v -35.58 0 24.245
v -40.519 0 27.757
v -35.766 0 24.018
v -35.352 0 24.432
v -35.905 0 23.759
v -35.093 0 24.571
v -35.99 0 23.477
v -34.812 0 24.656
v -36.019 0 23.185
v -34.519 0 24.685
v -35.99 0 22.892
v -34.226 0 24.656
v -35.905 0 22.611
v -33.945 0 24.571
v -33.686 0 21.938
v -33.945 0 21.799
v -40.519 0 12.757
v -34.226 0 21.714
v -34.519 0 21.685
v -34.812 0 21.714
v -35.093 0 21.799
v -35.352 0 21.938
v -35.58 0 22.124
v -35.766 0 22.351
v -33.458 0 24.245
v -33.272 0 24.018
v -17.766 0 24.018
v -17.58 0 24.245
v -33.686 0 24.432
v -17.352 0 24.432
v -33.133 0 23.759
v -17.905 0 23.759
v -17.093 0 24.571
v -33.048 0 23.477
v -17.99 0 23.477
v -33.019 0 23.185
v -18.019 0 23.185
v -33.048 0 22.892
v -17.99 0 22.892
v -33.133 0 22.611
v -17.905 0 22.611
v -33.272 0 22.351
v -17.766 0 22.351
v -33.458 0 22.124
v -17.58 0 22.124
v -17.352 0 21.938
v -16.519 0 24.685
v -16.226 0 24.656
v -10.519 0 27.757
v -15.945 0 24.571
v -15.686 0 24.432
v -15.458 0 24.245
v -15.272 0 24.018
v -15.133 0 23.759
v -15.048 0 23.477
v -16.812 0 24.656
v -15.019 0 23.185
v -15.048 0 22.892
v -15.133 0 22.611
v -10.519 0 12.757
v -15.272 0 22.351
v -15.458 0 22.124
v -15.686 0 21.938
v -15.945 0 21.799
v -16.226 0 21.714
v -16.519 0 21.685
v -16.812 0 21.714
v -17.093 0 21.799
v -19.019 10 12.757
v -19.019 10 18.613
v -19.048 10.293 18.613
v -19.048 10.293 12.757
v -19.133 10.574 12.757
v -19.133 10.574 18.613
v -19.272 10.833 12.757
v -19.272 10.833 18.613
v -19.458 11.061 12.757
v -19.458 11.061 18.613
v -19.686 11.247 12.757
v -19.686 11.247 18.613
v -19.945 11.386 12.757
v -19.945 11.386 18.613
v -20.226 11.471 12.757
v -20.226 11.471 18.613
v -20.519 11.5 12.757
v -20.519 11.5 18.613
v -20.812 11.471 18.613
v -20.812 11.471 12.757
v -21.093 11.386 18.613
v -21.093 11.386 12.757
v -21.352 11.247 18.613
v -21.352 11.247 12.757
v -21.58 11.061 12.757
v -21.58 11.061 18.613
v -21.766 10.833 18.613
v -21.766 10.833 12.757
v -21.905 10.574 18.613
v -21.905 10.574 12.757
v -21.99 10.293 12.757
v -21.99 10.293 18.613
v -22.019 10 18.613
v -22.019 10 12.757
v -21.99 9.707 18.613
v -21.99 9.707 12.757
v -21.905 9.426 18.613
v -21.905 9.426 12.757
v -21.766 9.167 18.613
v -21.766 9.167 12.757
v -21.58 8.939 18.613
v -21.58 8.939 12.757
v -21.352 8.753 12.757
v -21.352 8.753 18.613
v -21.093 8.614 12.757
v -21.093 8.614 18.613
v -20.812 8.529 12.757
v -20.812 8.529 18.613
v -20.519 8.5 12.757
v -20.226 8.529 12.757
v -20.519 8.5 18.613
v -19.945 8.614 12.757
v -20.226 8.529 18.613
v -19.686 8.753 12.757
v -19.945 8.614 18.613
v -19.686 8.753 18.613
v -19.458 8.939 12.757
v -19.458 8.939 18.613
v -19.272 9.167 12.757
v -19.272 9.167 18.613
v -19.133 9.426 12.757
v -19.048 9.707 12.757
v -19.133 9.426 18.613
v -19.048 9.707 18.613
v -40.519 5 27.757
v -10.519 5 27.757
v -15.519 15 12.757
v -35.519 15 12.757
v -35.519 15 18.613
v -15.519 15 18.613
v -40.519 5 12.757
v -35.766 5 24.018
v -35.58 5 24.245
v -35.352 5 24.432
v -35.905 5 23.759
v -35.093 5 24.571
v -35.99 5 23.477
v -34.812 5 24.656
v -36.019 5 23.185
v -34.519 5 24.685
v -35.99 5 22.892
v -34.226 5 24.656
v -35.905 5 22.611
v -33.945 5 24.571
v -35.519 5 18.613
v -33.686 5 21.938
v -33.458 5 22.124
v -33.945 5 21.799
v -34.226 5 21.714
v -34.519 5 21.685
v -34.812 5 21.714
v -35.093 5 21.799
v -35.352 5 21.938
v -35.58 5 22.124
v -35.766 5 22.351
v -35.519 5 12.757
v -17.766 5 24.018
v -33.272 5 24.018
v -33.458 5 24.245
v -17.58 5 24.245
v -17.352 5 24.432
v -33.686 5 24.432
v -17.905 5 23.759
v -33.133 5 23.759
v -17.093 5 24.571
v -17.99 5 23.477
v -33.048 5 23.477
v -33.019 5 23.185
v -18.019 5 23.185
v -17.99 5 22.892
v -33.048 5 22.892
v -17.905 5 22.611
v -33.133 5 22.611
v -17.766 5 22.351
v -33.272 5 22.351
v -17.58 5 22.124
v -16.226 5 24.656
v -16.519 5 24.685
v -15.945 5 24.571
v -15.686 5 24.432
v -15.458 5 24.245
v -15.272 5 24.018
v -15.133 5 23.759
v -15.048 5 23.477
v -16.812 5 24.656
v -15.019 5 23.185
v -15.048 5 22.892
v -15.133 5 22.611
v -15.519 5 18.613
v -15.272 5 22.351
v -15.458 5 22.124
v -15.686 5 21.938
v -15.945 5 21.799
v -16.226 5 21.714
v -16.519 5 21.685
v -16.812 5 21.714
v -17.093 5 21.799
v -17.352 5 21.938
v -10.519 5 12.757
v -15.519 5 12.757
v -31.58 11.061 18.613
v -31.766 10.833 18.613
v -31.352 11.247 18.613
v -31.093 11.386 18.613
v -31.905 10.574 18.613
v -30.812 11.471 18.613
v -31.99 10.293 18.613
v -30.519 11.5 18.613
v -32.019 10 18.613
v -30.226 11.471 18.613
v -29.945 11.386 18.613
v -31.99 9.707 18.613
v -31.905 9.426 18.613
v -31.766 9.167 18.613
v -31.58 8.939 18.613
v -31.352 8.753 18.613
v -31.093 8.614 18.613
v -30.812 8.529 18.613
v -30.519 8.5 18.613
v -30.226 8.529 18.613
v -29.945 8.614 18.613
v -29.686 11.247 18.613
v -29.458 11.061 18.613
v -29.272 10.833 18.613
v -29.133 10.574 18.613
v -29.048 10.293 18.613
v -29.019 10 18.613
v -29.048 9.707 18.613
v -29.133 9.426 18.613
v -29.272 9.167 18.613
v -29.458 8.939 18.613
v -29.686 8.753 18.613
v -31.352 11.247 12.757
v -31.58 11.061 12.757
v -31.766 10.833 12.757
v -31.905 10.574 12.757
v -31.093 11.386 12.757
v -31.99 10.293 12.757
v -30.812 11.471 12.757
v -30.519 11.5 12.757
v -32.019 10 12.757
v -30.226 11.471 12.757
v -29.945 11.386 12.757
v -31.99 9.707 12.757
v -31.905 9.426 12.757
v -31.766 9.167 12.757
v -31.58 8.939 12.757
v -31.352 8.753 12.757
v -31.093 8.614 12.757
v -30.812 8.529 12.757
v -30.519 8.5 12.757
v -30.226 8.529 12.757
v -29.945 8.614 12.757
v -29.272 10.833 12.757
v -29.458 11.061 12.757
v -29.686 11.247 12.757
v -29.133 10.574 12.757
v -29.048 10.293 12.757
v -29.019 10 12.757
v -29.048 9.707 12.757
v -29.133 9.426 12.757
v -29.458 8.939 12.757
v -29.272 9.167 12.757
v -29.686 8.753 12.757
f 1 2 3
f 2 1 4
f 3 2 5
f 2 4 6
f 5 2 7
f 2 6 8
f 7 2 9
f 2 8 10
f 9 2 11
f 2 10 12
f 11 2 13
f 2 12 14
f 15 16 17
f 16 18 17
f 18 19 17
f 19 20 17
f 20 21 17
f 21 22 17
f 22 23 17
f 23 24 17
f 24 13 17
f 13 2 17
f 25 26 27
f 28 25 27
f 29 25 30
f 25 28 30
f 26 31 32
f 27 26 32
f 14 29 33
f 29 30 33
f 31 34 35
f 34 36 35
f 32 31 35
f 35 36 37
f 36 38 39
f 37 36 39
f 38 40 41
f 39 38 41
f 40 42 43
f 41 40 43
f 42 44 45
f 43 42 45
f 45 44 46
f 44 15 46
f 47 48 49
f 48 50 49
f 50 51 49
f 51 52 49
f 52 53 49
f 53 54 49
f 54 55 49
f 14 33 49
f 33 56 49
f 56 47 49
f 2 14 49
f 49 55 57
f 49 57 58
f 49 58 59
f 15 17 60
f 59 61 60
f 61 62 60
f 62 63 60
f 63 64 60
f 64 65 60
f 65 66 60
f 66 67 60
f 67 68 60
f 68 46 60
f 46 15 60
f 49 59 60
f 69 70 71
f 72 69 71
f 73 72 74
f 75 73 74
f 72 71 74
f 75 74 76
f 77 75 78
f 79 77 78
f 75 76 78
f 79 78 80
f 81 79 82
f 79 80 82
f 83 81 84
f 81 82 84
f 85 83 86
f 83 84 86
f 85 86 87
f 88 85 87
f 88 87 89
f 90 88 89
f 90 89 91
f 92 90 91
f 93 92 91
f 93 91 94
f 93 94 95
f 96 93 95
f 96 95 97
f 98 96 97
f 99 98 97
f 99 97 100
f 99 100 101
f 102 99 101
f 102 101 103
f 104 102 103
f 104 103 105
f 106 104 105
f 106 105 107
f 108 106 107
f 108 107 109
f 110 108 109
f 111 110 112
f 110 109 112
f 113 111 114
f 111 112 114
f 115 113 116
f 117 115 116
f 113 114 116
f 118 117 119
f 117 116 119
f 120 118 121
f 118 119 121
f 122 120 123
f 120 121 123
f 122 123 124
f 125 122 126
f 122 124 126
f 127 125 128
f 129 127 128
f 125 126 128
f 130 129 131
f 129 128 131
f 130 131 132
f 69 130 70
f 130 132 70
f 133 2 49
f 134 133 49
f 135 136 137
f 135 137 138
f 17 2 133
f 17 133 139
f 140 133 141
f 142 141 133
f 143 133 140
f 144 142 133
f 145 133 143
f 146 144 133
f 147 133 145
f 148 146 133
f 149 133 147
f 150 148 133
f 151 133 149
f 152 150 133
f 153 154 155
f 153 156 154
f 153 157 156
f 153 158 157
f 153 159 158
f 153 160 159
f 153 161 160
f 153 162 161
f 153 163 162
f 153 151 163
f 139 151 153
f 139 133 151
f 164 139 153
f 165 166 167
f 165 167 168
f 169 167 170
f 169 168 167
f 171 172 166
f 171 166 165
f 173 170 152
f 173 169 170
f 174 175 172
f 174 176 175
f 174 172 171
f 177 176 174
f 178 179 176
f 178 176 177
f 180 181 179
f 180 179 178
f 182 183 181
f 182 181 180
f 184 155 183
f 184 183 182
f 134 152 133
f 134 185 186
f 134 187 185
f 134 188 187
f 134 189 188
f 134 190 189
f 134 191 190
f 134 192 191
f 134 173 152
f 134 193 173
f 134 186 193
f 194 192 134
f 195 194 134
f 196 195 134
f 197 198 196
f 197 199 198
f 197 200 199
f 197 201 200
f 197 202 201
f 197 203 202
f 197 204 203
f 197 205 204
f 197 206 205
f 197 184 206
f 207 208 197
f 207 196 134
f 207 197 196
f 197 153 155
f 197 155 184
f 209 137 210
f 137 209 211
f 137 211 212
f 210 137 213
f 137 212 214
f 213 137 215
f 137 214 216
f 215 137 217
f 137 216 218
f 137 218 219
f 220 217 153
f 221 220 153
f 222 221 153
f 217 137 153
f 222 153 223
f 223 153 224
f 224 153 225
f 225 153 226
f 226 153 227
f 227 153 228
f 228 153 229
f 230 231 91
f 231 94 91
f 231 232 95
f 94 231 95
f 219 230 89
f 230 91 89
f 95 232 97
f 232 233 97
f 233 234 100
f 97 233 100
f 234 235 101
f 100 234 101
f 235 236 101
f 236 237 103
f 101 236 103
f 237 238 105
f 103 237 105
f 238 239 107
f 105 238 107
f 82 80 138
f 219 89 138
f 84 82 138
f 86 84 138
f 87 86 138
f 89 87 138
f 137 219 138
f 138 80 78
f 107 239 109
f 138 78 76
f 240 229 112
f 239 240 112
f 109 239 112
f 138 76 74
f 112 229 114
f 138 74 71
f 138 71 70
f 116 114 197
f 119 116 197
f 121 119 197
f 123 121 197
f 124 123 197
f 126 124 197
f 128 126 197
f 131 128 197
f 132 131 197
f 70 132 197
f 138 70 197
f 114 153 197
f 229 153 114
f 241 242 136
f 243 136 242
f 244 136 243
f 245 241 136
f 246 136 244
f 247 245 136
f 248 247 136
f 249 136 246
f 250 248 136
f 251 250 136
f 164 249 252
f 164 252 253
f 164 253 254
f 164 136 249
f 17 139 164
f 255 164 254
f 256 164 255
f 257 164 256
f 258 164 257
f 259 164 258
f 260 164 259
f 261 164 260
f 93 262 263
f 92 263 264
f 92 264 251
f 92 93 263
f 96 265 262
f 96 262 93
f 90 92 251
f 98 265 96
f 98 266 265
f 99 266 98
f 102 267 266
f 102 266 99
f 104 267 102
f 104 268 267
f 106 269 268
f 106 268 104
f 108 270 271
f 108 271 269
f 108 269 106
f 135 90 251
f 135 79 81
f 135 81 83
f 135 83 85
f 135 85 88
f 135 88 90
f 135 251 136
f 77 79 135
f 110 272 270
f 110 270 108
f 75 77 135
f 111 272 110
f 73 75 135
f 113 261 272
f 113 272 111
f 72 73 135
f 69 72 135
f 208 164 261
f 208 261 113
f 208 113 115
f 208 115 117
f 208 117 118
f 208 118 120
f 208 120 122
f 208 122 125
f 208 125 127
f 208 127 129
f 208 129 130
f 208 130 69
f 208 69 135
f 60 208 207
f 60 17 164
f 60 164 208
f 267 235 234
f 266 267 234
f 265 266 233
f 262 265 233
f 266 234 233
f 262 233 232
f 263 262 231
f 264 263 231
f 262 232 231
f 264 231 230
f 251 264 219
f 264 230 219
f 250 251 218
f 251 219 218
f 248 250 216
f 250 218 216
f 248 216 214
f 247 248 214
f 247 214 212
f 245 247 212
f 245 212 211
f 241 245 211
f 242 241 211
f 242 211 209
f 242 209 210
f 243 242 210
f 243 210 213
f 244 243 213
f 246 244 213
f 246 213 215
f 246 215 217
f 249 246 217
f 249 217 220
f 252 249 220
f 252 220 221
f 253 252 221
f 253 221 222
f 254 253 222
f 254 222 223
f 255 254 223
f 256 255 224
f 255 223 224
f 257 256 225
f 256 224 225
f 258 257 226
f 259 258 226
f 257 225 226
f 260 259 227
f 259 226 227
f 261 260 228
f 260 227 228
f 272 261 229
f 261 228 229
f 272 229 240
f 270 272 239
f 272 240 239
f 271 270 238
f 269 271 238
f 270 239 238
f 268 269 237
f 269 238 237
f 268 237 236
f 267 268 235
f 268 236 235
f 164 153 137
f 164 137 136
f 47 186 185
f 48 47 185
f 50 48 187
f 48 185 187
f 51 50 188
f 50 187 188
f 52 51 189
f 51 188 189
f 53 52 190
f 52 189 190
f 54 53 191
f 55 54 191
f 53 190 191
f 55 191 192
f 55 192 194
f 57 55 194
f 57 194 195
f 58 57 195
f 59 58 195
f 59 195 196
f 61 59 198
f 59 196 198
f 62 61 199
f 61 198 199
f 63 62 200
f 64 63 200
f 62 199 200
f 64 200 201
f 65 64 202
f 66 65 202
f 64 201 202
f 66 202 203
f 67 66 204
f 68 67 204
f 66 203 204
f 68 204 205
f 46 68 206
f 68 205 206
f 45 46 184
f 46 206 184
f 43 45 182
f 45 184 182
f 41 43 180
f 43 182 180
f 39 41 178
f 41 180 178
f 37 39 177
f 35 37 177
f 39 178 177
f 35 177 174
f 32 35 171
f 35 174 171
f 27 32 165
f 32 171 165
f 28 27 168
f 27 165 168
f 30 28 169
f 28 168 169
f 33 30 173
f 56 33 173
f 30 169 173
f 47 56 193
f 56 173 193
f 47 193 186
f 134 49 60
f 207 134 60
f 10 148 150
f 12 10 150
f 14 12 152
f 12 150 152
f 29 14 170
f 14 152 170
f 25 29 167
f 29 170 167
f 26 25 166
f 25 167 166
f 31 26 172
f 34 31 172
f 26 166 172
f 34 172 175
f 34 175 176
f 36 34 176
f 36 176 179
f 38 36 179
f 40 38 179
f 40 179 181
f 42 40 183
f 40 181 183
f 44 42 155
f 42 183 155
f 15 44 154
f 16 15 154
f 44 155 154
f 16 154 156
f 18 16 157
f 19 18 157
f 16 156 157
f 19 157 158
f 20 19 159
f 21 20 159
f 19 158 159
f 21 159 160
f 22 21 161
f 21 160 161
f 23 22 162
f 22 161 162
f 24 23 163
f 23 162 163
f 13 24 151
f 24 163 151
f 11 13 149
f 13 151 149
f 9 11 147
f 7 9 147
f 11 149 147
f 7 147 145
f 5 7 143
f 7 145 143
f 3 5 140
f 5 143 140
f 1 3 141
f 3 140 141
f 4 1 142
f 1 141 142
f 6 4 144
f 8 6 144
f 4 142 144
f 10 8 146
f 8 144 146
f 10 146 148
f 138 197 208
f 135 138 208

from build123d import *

# Parameters (mm, degrees)
SKETCH_1_W          = 30
SKETCH_1_H          = 15
EXTRUDE_1_DEPTH     = 5
SKETCH_2_W          = 10
SKETCH_2_H          = 5.85548899
EXTRUDE_3_DEPTH     = 10
SKETCH_4_R          = 1.5
CUT_EXTRUDE_1_DEPTH = 6
SKETCH_5_R          = 1.5
CUT_EXTRUDE_2_DEPTH = 5


with BuildPart() as part:
    # Эскиз1 → Бобышка-Вытянуть1 (new body)
    with BuildSketch(Plane(origin=(0, 0, 0), x_dir=(1, 0, 0), z_dir=(0, 1, 0))):
        with Locations((-25.518864851, -20.257046334)):
            Rectangle(SKETCH_1_W, SKETCH_1_H)
    extrude(amount=EXTRUDE_1_DEPTH)

    # Эскиз2 → Бобышка-Вытянуть3 (add)
    with BuildSketch(Plane(origin=(0, 5, 0), x_dir=(1, 0, 0), z_dir=(0, 1, 0))):
        with Locations((-20.518864851, -15.684790829)):
            Rectangle(SKETCH_2_W, SKETCH_2_H)
        with Locations((-30.518864851, -15.684790829)):
            Rectangle(SKETCH_2_W, SKETCH_2_H)
    extrude(amount=EXTRUDE_3_DEPTH)

    # Эскиз4 → Вырез-Вытянуть1 (cut)
    with BuildSketch(Plane.XY.offset(18.612535324)):
        with Locations((-20.518864851, 10)):
            Circle(SKETCH_4_R)
        with Locations((-30.518864851, 10)):
            Circle(SKETCH_4_R)
    extrude(amount=-CUT_EXTRUDE_1_DEPTH, mode=Mode.SUBTRACT)

    # Эскиз5 → Вырез-Вытянуть2 (cut)
    with BuildSketch(Plane(origin=(0, 5, 0), x_dir=(1, 0, 0), z_dir=(0, 1, 0))):
        with Locations(Location((-34.518864851, -23.184790829, 0), (0, 0, 270))):
            Circle(SKETCH_5_R)
        with Locations(Location((-16.518864851, -23.184790829, 0), (0, 0, 270))):
            Circle(SKETCH_5_R)
    extrude(amount=-CUT_EXTRUDE_2_DEPTH, mode=Mode.SUBTRACT)


solid = part.part
